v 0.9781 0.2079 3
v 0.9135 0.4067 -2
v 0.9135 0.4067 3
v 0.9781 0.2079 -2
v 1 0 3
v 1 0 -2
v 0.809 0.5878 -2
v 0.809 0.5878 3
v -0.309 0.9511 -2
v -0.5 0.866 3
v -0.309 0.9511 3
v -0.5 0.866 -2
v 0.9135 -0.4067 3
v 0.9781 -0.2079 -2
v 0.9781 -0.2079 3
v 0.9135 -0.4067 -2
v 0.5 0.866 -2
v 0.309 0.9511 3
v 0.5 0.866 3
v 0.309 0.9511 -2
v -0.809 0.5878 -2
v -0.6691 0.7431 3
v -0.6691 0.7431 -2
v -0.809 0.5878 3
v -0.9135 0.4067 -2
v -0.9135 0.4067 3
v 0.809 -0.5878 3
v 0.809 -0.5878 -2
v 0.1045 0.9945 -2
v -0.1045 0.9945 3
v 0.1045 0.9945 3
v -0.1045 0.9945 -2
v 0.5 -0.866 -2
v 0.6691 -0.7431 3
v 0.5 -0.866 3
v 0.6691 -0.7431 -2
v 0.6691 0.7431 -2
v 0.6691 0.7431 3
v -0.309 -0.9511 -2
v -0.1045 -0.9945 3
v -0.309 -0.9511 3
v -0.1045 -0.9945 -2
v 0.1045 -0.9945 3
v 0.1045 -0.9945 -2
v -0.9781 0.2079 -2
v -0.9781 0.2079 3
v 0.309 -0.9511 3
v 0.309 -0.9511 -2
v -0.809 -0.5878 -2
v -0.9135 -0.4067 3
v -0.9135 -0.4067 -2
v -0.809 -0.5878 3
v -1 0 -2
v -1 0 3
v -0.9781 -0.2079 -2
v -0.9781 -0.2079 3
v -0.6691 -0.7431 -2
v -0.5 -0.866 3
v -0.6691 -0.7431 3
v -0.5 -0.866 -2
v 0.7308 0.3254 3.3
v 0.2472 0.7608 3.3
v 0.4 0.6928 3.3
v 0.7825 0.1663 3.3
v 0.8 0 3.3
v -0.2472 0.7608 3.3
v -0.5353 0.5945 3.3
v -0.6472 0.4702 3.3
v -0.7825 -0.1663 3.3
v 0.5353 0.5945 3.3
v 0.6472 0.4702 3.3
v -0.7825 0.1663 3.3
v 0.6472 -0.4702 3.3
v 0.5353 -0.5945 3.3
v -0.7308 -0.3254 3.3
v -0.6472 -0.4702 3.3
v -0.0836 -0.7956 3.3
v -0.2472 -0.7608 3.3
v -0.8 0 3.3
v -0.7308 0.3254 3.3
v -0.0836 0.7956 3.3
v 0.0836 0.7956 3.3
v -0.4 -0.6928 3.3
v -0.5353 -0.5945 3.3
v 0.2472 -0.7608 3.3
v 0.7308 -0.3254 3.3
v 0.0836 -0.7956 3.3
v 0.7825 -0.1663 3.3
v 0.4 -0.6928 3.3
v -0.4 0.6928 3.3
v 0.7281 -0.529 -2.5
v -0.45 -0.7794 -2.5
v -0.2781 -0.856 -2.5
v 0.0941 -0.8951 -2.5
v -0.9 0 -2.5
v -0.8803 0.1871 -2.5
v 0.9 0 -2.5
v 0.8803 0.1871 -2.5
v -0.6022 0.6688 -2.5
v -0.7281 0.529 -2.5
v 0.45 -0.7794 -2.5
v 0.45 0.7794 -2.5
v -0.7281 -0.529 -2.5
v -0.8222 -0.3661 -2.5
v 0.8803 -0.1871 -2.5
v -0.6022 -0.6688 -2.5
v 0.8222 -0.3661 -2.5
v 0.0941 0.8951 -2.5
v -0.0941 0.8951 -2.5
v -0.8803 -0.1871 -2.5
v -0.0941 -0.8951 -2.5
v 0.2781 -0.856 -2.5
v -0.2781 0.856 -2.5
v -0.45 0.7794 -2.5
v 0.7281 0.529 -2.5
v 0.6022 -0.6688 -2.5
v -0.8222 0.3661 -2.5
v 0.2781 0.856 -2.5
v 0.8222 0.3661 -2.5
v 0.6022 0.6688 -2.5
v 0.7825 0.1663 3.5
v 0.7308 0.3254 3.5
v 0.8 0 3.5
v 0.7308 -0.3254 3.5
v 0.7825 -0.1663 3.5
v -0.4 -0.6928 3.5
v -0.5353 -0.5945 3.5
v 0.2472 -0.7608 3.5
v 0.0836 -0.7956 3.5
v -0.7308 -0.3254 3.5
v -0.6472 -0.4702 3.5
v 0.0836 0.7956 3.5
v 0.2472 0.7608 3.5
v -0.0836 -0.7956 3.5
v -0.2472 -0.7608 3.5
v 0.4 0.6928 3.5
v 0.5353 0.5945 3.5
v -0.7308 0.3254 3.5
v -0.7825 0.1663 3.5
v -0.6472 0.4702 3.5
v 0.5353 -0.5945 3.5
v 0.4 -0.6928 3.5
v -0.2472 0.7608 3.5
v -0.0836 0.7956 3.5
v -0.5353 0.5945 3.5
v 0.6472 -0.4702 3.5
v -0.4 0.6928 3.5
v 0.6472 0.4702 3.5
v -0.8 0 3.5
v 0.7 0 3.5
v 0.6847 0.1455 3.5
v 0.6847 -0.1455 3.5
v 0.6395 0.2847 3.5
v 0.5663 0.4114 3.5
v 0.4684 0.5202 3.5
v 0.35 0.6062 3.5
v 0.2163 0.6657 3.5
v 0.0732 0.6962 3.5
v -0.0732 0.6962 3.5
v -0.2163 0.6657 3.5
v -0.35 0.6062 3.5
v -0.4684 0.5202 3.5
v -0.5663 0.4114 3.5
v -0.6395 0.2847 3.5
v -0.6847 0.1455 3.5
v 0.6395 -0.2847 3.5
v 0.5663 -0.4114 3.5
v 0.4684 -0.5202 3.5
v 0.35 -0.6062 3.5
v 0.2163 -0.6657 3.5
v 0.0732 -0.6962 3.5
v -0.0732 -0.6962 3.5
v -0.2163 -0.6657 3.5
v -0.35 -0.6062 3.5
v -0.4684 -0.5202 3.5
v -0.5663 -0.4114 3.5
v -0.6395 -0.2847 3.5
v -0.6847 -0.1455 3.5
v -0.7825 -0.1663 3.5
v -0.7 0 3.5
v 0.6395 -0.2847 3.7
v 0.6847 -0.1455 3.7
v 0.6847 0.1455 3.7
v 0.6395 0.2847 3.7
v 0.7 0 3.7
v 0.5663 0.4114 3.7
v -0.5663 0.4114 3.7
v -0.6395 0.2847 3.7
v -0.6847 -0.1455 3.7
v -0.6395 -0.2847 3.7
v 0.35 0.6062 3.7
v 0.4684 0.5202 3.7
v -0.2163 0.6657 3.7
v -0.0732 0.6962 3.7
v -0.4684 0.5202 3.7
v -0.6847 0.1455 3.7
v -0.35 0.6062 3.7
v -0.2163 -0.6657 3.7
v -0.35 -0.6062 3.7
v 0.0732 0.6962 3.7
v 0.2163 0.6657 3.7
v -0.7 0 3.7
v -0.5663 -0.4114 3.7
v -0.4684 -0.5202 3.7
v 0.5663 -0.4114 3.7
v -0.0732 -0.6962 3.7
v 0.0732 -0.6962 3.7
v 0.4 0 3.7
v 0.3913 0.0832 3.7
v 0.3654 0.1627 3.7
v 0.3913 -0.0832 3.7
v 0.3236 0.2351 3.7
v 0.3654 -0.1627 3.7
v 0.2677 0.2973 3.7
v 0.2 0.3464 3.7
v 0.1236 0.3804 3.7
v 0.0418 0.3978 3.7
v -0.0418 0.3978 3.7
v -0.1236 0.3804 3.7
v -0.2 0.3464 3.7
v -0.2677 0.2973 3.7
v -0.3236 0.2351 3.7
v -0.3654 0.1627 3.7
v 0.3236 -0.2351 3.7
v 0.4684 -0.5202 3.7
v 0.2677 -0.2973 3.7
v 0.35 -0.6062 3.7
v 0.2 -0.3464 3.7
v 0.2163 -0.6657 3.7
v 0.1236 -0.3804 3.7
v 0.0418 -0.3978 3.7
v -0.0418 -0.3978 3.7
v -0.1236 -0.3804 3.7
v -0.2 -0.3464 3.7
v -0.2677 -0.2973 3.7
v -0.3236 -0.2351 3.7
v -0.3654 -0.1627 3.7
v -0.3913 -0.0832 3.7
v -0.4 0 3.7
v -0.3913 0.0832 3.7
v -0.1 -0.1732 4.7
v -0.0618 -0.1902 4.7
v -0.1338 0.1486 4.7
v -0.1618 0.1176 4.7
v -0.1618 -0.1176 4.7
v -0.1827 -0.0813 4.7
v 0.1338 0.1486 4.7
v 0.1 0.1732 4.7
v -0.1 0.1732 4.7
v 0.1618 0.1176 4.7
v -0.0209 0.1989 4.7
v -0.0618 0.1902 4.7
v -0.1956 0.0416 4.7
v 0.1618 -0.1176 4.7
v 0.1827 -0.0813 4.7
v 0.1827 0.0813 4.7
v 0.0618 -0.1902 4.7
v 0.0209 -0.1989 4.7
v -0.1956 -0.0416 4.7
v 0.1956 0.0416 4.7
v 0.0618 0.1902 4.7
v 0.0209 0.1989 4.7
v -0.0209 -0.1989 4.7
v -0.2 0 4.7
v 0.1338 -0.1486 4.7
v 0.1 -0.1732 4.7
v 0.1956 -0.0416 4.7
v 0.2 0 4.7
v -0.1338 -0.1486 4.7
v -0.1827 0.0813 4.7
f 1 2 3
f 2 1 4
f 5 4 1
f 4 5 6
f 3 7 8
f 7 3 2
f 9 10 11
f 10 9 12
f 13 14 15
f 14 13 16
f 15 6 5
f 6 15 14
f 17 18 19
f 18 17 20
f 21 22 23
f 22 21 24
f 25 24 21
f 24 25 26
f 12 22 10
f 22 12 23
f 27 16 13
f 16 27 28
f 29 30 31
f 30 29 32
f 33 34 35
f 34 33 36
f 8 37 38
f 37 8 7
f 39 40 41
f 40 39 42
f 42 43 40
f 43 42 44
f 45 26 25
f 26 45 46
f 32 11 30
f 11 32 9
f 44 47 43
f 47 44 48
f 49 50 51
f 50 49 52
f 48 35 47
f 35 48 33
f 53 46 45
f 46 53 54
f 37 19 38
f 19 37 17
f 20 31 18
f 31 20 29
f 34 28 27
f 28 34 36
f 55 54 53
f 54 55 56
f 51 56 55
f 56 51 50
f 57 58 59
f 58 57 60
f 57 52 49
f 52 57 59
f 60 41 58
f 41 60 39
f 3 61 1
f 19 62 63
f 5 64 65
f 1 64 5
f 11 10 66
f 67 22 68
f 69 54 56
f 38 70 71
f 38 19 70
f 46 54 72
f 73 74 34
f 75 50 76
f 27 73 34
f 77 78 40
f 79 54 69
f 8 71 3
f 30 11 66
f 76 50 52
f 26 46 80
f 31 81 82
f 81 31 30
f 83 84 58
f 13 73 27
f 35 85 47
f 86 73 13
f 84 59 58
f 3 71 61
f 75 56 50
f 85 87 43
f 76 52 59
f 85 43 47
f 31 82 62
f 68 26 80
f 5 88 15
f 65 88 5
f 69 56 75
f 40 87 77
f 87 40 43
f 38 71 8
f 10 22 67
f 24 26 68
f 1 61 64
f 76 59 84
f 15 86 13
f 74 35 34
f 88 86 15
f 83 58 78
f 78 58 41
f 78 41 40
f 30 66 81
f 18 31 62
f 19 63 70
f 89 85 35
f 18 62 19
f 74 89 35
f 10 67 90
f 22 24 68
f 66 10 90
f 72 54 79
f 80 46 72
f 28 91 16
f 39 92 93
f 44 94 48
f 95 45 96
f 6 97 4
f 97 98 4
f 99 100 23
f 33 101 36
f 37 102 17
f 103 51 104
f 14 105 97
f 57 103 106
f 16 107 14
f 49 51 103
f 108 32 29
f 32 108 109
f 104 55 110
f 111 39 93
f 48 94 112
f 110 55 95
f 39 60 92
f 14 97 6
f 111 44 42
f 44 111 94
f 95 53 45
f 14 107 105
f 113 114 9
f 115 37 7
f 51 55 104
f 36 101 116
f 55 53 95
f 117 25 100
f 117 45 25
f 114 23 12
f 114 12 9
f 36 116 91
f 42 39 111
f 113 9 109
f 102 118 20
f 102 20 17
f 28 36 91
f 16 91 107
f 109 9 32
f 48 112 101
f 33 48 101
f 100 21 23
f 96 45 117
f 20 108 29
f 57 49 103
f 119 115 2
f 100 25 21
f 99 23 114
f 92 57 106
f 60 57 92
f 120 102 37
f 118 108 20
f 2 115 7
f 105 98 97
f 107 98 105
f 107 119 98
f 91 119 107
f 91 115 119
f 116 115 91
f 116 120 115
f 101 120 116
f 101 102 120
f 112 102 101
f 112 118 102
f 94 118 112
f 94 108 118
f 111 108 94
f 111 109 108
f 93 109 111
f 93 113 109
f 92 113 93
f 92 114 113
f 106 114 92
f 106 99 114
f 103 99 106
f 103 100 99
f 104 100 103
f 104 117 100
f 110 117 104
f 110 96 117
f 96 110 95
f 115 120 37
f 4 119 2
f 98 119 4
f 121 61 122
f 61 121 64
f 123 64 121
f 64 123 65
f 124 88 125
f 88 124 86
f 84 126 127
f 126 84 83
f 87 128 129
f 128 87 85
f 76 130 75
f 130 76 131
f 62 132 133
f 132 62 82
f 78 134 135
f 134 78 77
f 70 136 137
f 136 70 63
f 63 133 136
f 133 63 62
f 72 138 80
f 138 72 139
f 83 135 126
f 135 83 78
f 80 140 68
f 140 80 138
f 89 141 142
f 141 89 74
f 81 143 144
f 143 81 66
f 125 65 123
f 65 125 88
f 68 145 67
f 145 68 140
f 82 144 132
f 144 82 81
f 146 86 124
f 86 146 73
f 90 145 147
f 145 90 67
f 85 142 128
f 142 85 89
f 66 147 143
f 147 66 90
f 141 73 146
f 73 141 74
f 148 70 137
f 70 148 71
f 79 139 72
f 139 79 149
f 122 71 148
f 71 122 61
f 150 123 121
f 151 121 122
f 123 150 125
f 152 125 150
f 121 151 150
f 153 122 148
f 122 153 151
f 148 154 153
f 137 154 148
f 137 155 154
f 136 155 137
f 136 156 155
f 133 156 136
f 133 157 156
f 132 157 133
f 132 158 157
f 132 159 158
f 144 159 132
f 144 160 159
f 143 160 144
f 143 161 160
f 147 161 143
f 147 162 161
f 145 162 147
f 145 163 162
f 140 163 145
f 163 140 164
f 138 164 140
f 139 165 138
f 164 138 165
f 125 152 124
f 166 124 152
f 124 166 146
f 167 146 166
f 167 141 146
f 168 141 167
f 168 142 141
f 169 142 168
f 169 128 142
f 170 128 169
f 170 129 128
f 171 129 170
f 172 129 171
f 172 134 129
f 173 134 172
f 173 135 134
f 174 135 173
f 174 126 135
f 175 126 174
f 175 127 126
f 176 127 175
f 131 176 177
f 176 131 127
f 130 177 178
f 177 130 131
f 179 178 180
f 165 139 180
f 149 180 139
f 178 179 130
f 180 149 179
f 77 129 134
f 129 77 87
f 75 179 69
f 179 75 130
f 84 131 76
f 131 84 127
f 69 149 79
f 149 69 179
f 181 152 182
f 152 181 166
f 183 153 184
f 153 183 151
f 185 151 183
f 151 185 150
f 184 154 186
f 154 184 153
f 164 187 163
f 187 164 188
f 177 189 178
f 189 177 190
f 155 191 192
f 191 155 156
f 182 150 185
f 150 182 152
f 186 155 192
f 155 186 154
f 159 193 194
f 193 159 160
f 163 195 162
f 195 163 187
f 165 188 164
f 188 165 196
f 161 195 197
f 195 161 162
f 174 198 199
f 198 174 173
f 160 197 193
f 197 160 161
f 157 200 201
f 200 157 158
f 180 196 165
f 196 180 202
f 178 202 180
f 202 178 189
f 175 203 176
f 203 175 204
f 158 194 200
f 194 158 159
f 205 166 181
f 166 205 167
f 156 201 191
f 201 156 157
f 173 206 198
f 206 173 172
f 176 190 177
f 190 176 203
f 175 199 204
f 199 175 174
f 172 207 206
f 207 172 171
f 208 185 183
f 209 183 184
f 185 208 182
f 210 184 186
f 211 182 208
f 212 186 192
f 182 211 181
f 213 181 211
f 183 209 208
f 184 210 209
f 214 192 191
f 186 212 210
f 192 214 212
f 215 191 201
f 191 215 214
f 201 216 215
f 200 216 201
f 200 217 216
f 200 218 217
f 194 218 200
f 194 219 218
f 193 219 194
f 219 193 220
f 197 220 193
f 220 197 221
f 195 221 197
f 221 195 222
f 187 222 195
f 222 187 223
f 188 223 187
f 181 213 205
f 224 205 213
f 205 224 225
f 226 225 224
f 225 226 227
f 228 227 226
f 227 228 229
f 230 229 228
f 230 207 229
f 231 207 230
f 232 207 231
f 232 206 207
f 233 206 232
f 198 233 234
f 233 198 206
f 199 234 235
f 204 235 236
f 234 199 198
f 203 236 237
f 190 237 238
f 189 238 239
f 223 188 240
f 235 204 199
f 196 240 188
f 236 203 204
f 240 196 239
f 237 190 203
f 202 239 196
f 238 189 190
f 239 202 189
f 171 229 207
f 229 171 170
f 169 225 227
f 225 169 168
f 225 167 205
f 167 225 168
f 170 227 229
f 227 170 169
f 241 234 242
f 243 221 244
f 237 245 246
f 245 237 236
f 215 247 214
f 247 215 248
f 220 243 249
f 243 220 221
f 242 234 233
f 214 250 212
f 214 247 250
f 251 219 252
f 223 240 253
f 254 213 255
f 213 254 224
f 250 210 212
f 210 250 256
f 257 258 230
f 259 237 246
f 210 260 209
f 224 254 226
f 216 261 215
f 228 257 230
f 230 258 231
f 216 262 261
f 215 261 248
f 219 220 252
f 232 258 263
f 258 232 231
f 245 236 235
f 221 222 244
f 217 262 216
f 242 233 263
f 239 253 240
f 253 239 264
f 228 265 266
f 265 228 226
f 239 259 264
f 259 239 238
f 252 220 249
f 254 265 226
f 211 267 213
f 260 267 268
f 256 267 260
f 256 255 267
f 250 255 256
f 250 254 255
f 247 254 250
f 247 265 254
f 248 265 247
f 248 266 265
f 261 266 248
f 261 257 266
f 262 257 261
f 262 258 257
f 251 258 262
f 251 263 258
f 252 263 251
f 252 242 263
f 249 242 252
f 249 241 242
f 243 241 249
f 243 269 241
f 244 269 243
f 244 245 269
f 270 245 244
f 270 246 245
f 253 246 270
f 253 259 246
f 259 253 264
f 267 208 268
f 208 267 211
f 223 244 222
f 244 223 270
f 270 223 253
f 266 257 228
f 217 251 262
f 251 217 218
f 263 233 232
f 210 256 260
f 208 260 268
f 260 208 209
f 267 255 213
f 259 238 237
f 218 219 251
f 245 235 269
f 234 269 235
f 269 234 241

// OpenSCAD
color("#ffffee"){
// color("#ec0606"){
translate([0,0,0.5])
cylinder(5, 1,1, $fn = 30, center = true);
}


color("#ffffee"){
//color("#ec0606"){
translate([0,0,3])
cylinder(0.3, 1,0.8, $fn = 30);
}

color("#ffffee"){
//color("#ec0606"){
translate([0,0,-2.5])
cylinder(0.5,0.9,1, $fn = 30);
}


color("#f9f2f2"){
translate([0,0,3.3])
cylinder(0.2, 0.8,0.8, $fn = 30);
}


color("#f9f2f2"){
translate([0,0,3.5])
cylinder(0.2, 0.7,0.7, $fn = 30);
}


color("#f9f2f2"){
translate([0,0,3.7])
cylinder(1, 0.4,0.2, $fn = 30);
}
